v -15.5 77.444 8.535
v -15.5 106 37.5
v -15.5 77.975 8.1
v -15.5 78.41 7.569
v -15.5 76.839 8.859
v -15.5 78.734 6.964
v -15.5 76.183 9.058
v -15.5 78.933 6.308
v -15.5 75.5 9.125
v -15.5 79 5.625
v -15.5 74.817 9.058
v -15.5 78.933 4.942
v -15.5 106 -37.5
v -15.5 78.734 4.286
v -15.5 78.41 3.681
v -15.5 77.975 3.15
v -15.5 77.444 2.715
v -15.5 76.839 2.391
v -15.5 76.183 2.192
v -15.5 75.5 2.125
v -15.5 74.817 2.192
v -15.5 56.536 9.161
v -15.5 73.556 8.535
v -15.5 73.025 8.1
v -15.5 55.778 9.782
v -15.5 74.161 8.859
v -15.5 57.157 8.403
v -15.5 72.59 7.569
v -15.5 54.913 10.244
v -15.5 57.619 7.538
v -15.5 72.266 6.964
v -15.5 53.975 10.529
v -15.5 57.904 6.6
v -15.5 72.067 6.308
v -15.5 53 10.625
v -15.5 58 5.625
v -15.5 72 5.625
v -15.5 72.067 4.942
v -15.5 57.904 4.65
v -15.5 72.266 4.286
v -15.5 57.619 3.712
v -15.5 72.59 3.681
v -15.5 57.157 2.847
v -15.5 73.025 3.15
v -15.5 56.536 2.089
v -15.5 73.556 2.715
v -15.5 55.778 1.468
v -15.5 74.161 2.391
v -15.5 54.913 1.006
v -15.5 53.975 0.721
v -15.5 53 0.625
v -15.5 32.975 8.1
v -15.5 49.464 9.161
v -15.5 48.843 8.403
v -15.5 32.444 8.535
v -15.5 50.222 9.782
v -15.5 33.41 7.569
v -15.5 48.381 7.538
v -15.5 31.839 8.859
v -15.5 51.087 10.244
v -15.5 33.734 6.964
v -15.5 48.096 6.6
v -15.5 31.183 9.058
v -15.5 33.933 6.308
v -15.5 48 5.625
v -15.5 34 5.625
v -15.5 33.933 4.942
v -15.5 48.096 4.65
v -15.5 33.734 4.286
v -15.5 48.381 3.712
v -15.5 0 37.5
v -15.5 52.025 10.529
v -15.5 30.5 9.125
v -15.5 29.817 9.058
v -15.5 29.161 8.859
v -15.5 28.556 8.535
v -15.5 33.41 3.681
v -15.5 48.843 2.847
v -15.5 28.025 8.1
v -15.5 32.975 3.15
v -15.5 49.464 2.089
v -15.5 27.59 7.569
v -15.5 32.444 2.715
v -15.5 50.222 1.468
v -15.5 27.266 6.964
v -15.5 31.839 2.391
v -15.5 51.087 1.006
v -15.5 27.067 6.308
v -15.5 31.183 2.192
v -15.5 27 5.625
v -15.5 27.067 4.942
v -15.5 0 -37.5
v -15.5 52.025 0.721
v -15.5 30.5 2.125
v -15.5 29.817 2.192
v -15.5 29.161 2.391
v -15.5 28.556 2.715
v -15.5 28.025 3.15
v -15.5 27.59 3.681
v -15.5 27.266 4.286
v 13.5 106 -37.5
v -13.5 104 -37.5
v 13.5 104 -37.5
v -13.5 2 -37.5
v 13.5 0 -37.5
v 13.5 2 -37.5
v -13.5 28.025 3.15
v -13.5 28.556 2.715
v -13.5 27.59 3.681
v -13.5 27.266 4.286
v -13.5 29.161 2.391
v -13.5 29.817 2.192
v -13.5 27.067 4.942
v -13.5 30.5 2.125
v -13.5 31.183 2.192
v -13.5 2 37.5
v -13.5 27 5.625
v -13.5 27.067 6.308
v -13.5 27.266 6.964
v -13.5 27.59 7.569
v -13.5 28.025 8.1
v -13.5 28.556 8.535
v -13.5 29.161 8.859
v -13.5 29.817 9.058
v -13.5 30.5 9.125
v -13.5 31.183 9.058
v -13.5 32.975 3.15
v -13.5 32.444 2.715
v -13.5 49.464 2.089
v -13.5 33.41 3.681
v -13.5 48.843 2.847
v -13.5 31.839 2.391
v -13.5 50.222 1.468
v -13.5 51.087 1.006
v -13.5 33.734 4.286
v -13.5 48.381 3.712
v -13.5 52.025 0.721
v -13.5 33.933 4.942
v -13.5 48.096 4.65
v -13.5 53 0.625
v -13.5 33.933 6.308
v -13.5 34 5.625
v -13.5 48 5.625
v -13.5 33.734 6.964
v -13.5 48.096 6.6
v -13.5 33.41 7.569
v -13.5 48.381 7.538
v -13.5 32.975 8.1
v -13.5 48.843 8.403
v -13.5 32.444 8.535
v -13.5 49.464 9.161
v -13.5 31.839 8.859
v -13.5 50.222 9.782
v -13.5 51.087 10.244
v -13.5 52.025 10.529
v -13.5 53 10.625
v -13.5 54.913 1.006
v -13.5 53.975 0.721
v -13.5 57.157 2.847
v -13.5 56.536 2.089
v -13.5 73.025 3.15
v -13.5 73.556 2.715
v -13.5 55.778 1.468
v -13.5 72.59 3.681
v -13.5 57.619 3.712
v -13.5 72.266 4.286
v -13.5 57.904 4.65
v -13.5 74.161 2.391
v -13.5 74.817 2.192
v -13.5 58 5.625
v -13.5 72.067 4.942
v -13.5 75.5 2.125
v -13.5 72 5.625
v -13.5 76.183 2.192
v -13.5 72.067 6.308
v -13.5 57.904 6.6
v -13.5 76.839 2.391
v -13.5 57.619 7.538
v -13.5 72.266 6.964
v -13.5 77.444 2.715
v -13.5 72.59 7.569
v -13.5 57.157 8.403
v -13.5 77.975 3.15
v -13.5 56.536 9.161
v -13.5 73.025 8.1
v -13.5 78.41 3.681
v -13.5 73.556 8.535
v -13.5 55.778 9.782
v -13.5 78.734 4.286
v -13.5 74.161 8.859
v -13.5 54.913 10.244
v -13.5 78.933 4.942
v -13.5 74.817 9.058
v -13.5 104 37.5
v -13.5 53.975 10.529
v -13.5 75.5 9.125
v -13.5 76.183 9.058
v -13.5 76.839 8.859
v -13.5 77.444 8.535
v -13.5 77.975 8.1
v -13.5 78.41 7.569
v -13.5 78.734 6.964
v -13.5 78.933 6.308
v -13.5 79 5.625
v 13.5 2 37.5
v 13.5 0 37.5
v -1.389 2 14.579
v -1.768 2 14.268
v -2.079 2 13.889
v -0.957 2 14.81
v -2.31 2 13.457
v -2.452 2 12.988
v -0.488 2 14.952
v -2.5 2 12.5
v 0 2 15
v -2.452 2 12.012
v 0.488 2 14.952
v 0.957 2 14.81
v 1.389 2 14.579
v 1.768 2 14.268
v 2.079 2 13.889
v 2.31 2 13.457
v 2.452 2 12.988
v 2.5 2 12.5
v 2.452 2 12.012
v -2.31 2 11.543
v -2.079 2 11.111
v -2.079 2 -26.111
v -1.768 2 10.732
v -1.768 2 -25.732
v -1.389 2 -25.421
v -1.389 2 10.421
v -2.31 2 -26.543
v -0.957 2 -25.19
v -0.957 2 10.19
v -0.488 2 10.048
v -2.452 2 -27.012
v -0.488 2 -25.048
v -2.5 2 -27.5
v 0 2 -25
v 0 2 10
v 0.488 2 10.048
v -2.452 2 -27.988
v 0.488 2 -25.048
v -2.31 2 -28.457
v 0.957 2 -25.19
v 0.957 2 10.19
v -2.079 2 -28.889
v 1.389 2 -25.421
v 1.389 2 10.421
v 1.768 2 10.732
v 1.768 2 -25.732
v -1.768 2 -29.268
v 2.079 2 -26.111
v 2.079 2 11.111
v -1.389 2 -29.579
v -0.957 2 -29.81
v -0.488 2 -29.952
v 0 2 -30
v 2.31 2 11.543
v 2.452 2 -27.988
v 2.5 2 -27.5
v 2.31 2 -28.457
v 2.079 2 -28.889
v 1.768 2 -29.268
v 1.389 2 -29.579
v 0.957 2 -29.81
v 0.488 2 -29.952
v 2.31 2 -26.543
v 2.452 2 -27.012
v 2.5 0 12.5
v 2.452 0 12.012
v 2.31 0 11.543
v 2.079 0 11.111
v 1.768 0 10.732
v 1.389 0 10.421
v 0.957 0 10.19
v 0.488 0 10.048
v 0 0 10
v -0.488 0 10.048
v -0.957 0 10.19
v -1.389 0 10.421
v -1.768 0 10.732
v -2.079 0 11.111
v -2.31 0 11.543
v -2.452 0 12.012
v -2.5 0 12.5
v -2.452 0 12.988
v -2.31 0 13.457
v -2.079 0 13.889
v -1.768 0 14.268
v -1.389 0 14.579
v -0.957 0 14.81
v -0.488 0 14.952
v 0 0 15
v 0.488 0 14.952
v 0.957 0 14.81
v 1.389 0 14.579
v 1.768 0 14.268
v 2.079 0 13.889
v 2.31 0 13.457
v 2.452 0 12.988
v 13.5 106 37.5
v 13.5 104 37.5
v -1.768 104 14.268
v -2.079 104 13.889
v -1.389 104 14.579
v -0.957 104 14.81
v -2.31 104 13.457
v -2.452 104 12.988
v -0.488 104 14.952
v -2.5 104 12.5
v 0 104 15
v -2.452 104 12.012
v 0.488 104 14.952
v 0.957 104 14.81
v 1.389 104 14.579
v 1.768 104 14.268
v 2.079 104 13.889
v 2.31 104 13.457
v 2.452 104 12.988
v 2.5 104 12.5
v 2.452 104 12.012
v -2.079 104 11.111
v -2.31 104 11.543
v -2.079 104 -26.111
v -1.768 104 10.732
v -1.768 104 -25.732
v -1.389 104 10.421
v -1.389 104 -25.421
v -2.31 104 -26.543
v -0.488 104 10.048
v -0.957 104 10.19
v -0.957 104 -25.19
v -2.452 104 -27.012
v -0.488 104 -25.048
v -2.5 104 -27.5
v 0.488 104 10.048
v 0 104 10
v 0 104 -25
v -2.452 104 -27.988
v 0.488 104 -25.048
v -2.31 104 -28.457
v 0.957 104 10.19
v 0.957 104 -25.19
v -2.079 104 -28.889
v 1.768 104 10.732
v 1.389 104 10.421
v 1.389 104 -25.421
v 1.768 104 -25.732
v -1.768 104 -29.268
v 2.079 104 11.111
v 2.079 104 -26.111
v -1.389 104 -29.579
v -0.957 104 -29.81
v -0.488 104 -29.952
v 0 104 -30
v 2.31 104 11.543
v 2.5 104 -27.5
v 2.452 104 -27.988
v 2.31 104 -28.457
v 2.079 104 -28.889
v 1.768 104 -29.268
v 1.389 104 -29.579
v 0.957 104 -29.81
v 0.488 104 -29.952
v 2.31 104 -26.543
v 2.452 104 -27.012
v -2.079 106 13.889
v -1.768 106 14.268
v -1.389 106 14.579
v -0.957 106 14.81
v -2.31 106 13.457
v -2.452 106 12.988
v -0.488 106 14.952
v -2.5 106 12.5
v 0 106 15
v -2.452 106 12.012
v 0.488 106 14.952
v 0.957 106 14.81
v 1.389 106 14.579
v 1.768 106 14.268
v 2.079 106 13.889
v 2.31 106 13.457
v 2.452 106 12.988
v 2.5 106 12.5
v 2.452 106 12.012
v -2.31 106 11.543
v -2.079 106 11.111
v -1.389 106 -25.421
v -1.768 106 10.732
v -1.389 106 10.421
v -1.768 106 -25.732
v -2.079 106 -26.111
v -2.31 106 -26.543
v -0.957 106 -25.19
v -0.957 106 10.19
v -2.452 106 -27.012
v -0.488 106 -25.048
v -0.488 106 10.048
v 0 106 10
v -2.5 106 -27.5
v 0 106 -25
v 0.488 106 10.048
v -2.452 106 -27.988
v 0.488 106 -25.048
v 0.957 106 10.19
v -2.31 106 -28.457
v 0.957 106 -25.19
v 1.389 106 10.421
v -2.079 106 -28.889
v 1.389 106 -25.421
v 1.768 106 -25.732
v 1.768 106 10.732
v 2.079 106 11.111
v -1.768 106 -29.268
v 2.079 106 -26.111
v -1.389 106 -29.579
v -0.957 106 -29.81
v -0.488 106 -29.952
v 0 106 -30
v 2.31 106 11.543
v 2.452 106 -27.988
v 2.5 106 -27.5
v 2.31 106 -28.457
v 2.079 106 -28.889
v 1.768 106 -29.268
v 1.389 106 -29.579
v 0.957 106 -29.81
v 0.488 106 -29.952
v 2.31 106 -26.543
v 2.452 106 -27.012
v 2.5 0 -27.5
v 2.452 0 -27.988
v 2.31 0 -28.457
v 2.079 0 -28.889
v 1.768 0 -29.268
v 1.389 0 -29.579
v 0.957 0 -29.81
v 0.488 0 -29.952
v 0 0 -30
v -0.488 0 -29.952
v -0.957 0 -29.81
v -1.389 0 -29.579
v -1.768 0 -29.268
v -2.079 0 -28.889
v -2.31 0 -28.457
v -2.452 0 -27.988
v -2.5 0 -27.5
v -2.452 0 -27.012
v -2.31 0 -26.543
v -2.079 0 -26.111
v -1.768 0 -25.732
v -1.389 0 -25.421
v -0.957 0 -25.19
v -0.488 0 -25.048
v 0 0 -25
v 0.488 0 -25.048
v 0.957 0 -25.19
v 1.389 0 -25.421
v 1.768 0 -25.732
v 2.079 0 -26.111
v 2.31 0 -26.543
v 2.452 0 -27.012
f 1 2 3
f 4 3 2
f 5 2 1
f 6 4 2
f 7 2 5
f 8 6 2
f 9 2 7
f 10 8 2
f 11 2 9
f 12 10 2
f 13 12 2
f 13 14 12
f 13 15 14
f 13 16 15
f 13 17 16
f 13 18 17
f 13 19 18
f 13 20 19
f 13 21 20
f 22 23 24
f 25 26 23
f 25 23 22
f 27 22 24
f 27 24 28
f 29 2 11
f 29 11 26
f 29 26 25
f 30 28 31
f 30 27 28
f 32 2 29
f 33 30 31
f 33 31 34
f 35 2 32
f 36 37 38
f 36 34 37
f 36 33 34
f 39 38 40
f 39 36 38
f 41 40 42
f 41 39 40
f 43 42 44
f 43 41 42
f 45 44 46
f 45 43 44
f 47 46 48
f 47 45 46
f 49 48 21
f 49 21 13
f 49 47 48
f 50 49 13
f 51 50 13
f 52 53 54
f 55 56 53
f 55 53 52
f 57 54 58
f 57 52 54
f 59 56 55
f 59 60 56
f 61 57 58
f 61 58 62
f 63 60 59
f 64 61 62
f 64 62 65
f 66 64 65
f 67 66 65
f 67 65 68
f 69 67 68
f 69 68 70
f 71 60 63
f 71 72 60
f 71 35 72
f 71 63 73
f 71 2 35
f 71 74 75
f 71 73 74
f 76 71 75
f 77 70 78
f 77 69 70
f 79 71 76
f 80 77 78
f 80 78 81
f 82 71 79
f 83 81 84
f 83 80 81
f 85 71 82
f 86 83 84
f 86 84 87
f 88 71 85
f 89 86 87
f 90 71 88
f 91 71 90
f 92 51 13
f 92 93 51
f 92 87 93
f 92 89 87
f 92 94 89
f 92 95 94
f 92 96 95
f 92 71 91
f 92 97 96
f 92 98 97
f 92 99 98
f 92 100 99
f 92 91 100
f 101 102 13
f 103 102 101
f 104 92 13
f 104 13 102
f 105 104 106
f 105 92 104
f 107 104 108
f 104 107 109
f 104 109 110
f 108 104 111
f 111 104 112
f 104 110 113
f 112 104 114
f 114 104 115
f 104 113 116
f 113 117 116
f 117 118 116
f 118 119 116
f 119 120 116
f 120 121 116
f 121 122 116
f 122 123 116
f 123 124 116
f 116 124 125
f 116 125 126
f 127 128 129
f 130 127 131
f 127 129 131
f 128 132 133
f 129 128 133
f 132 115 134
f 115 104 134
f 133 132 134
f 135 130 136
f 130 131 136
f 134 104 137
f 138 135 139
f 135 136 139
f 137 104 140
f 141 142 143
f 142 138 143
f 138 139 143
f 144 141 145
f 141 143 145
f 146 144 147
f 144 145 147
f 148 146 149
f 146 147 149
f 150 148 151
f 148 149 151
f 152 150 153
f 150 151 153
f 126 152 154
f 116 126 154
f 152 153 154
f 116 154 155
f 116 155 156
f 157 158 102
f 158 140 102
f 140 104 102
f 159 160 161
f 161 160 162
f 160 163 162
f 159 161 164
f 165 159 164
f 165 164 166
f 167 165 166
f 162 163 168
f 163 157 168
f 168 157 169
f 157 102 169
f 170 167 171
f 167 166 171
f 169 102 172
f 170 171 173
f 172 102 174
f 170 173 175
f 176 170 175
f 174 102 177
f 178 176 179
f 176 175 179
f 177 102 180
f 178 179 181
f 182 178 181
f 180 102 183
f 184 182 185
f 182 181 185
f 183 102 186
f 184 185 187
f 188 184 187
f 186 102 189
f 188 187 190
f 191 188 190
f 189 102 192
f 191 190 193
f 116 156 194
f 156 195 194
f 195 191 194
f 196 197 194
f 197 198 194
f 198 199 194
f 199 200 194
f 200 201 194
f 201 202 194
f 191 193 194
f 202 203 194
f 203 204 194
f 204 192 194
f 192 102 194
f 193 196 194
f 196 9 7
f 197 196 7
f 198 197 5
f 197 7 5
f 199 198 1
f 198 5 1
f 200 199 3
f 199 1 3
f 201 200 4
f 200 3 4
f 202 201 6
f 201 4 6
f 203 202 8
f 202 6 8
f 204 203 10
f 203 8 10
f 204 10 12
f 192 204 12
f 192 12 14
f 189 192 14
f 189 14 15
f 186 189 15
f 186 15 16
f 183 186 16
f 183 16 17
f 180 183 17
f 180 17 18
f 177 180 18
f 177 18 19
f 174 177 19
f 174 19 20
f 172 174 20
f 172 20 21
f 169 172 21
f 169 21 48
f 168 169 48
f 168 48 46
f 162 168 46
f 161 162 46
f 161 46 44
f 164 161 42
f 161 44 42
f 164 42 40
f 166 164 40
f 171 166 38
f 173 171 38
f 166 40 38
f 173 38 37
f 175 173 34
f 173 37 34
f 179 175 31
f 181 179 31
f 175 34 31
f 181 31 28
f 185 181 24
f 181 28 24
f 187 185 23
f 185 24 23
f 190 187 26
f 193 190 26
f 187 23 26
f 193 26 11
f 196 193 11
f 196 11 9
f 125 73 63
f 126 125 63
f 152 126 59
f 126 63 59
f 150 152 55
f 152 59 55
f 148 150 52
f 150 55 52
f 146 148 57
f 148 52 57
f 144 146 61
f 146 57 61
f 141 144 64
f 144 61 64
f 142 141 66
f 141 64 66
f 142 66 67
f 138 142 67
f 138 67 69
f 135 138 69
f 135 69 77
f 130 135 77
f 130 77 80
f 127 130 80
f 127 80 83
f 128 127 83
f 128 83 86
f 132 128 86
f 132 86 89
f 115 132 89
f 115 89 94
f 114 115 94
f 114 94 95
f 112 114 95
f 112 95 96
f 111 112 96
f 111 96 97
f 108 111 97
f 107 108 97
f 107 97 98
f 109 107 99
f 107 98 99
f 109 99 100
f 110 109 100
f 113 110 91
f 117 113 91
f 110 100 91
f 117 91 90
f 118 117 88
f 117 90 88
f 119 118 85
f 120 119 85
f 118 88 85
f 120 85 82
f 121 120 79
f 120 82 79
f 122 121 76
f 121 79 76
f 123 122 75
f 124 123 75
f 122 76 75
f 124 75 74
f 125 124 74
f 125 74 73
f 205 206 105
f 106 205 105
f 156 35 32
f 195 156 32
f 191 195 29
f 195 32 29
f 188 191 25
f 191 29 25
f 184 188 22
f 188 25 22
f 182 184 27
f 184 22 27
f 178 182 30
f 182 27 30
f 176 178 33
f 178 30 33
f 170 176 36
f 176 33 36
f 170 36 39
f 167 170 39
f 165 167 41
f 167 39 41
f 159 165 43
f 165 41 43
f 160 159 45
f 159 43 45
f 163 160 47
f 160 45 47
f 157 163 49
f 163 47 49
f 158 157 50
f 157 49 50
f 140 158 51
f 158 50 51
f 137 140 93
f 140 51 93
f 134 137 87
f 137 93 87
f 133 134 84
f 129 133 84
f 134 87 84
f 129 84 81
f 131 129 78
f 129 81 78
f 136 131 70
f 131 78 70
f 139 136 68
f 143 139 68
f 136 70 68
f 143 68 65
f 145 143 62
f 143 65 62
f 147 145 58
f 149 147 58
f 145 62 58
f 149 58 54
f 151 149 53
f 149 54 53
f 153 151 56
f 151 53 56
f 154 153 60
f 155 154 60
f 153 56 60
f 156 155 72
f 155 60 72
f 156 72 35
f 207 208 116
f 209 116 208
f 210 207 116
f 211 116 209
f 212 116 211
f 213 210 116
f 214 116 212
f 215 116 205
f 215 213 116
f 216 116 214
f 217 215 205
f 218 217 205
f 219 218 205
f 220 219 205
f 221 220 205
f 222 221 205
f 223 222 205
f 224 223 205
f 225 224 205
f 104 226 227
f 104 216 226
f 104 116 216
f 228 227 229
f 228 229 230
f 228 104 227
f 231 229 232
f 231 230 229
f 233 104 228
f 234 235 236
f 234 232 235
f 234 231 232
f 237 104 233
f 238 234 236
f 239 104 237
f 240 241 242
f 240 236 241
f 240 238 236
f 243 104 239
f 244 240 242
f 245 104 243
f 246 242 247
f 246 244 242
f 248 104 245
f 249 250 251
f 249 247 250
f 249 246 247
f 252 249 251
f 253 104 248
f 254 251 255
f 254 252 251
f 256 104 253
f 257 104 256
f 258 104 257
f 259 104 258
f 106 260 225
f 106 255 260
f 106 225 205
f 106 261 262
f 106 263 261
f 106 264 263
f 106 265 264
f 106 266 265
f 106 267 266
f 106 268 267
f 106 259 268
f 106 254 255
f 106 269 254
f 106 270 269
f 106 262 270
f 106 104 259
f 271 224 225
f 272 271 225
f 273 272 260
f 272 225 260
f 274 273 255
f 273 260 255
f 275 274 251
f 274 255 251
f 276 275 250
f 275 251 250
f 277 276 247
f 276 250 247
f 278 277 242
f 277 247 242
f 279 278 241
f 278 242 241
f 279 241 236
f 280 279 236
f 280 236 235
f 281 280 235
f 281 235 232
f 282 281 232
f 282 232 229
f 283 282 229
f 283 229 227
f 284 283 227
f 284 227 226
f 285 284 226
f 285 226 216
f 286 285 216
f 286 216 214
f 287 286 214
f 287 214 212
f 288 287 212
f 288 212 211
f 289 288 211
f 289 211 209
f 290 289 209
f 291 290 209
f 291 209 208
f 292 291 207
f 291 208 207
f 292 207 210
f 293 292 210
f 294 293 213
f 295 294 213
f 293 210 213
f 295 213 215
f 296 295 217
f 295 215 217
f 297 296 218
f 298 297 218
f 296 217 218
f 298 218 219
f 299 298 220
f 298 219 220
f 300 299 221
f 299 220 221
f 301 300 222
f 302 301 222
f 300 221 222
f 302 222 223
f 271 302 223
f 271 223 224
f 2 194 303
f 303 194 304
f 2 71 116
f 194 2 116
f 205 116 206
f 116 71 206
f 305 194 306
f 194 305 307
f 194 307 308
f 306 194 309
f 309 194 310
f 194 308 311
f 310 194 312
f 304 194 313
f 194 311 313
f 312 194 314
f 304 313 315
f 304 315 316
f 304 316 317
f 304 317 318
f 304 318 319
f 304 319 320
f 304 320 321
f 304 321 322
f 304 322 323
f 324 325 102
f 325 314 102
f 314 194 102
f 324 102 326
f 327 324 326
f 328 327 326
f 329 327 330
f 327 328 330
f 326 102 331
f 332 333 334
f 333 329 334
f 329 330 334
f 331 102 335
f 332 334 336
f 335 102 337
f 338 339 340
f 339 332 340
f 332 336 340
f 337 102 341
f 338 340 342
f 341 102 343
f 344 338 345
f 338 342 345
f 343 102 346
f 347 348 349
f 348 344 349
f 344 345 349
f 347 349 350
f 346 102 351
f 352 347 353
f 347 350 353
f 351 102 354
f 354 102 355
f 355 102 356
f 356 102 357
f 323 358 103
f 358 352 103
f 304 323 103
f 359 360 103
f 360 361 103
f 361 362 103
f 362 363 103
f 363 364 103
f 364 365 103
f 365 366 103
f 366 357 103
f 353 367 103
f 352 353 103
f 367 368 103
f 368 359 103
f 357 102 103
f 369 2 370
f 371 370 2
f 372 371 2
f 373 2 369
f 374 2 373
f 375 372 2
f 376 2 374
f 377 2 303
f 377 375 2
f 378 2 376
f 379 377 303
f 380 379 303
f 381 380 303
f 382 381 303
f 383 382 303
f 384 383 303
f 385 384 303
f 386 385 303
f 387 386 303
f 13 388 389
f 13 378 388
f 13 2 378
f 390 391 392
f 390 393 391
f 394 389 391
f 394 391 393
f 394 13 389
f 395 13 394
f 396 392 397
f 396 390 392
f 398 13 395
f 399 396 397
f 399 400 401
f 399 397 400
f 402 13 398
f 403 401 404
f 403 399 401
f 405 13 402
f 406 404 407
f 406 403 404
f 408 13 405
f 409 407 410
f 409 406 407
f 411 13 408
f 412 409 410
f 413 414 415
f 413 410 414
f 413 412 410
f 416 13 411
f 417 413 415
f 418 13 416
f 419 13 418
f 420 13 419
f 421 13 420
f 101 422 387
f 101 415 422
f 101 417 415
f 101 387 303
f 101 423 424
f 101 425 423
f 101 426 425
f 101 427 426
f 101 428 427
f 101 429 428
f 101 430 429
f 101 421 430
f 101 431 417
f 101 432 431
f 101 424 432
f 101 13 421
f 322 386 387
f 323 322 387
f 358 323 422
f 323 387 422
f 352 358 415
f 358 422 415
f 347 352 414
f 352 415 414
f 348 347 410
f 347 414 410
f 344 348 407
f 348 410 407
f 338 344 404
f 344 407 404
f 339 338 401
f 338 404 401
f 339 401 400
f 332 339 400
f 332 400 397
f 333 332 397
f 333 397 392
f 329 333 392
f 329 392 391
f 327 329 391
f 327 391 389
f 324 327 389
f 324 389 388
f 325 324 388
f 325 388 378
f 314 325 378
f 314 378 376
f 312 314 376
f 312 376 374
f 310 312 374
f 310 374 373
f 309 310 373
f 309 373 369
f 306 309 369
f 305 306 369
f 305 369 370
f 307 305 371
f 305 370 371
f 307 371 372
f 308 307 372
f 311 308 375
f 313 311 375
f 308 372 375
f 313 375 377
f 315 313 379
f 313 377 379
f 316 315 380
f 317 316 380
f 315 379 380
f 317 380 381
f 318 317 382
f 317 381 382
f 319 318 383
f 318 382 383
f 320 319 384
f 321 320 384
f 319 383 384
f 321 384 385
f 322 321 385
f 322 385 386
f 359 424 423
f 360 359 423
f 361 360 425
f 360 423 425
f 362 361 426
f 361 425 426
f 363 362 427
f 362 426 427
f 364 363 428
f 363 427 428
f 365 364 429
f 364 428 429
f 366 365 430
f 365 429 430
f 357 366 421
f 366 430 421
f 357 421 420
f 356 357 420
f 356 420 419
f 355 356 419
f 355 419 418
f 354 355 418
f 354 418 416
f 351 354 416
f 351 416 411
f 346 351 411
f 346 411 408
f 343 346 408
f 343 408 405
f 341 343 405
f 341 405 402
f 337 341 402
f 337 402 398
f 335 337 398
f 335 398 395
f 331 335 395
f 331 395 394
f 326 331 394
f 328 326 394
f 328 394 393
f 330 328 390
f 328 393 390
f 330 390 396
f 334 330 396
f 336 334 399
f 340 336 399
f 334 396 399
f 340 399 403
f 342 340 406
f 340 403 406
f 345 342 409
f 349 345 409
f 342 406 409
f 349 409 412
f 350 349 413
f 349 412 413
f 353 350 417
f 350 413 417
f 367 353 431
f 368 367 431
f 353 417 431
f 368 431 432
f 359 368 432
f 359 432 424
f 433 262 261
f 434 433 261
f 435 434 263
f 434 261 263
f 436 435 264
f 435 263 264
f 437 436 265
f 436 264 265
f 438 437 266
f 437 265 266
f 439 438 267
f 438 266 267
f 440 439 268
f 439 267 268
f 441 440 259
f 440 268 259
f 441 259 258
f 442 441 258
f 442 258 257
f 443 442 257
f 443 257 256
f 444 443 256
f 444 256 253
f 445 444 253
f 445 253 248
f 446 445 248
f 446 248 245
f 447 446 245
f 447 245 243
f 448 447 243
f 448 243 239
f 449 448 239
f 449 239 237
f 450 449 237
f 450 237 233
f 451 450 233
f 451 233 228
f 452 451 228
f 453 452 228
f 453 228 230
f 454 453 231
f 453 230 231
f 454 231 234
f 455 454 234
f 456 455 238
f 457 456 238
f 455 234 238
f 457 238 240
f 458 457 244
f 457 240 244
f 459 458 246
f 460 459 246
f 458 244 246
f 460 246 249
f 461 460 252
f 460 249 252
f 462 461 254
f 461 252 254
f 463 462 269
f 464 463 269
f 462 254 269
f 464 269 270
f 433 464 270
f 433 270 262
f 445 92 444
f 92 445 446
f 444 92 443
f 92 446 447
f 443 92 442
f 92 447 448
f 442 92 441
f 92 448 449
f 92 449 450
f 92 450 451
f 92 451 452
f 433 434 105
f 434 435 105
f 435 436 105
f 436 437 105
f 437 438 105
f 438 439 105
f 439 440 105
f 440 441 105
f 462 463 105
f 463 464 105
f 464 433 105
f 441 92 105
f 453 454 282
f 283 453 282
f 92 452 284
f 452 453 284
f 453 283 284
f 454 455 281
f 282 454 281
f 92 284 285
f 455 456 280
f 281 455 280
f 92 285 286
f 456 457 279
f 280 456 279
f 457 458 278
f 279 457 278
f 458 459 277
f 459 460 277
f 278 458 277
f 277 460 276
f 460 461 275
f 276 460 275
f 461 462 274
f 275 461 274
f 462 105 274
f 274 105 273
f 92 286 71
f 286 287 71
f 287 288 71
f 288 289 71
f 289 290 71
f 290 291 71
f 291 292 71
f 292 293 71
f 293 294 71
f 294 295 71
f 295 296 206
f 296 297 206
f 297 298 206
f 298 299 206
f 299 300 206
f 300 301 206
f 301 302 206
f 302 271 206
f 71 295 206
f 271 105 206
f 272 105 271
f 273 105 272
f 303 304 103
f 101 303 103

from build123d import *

# Parameters (mm, degrees)
ESBO_O1_W                  = 27
ESBO_O1_H                  = 75
RESSALTO_EXTRUS_O1_DEPTH   = 2
ESBO_O2_W                  = 75
ESBO_O2_H                  = 104
RESSALTO_EXTRUS_O2_DEPTH   = 2
ESBO_O3_W                  = 29
ESBO_O3_H                  = 75
RESSALTO_EXTRUS_O3_DEPTH   = 2
ESBO_O4_R                  = 5
CORTE_EXTRUS_O1_DEPTH      = 2
ESBO_O5_R                  = 2.5
CORTE_EXTRUS_O2_DEPTH      = 1
CORTE_EXTRUS_O2_DEPTH_BACK = 107
ESBO_O7_R                  = 3.5
CORTE_EXTRUS_O3_DEPTH      = 10


with BuildPart() as part:
    # Esboço1 → Ressalto-extrusão1 (new body)
    with BuildSketch(Plane(origin=(0, 0, 0), x_dir=(1, 0, 0), z_dir=(0, 1, 0))):
        Rectangle(ESBO_O1_W, ESBO_O1_H)
    extrude(amount=RESSALTO_EXTRUS_O1_DEPTH)

    # Esboço2 → Ressalto-extrusão2 (add)
    with BuildSketch(Plane.ZY.offset(13.5)):
        with Locations((0, 52)):
            Rectangle(ESBO_O2_W, ESBO_O2_H)
    extrude(amount=RESSALTO_EXTRUS_O2_DEPTH)

    # Esboço3 → Ressalto-extrusão3 (add)
    with BuildSketch(Plane(origin=(0, 104, 0), x_dir=(1, 0, 0), z_dir=(0, 1, 0))):
        with Locations((-1, 0)):
            Rectangle(ESBO_O3_W, ESBO_O3_H)
    extrude(amount=RESSALTO_EXTRUS_O3_DEPTH)

    # Esboço4 → Corte-extrusão1 (cut)
    with BuildSketch(Plane.ZY.offset(15.5)):
        with Locations((5.625, 53)):
            Circle(ESBO_O4_R)
    extrude(amount=-CORTE_EXTRUS_O1_DEPTH, mode=Mode.SUBTRACT)

    # Esboço5 → Corte-extrusão2 (cut, two sides)
    with BuildSketch(Plane(origin=(0, 106, 0), x_dir=(1, 0, 0), z_dir=(0, 1, 0))) as corte_extrus_o2_sk:
        with Locations((0, 27.5)):
            Circle(ESBO_O5_R)
        with Locations((0, -12.5)):
            Circle(ESBO_O5_R)
    extrude(amount=CORTE_EXTRUS_O2_DEPTH, mode=Mode.SUBTRACT)
    extrude(corte_extrus_o2_sk.sketch, amount=-CORTE_EXTRUS_O2_DEPTH_BACK, mode=Mode.SUBTRACT)

    # Esboço7 → Corte-extrusão3 (cut)
    with BuildSketch(Plane.ZY.offset(15.5)):
        with Locations((5.625, 75.5)):
            Circle(ESBO_O7_R)
        with Locations((5.625, 30.5)):
            Circle(ESBO_O7_R)
    extrude(amount=-CORTE_EXTRUS_O3_DEPTH, mode=Mode.SUBTRACT)


solid = part.part
